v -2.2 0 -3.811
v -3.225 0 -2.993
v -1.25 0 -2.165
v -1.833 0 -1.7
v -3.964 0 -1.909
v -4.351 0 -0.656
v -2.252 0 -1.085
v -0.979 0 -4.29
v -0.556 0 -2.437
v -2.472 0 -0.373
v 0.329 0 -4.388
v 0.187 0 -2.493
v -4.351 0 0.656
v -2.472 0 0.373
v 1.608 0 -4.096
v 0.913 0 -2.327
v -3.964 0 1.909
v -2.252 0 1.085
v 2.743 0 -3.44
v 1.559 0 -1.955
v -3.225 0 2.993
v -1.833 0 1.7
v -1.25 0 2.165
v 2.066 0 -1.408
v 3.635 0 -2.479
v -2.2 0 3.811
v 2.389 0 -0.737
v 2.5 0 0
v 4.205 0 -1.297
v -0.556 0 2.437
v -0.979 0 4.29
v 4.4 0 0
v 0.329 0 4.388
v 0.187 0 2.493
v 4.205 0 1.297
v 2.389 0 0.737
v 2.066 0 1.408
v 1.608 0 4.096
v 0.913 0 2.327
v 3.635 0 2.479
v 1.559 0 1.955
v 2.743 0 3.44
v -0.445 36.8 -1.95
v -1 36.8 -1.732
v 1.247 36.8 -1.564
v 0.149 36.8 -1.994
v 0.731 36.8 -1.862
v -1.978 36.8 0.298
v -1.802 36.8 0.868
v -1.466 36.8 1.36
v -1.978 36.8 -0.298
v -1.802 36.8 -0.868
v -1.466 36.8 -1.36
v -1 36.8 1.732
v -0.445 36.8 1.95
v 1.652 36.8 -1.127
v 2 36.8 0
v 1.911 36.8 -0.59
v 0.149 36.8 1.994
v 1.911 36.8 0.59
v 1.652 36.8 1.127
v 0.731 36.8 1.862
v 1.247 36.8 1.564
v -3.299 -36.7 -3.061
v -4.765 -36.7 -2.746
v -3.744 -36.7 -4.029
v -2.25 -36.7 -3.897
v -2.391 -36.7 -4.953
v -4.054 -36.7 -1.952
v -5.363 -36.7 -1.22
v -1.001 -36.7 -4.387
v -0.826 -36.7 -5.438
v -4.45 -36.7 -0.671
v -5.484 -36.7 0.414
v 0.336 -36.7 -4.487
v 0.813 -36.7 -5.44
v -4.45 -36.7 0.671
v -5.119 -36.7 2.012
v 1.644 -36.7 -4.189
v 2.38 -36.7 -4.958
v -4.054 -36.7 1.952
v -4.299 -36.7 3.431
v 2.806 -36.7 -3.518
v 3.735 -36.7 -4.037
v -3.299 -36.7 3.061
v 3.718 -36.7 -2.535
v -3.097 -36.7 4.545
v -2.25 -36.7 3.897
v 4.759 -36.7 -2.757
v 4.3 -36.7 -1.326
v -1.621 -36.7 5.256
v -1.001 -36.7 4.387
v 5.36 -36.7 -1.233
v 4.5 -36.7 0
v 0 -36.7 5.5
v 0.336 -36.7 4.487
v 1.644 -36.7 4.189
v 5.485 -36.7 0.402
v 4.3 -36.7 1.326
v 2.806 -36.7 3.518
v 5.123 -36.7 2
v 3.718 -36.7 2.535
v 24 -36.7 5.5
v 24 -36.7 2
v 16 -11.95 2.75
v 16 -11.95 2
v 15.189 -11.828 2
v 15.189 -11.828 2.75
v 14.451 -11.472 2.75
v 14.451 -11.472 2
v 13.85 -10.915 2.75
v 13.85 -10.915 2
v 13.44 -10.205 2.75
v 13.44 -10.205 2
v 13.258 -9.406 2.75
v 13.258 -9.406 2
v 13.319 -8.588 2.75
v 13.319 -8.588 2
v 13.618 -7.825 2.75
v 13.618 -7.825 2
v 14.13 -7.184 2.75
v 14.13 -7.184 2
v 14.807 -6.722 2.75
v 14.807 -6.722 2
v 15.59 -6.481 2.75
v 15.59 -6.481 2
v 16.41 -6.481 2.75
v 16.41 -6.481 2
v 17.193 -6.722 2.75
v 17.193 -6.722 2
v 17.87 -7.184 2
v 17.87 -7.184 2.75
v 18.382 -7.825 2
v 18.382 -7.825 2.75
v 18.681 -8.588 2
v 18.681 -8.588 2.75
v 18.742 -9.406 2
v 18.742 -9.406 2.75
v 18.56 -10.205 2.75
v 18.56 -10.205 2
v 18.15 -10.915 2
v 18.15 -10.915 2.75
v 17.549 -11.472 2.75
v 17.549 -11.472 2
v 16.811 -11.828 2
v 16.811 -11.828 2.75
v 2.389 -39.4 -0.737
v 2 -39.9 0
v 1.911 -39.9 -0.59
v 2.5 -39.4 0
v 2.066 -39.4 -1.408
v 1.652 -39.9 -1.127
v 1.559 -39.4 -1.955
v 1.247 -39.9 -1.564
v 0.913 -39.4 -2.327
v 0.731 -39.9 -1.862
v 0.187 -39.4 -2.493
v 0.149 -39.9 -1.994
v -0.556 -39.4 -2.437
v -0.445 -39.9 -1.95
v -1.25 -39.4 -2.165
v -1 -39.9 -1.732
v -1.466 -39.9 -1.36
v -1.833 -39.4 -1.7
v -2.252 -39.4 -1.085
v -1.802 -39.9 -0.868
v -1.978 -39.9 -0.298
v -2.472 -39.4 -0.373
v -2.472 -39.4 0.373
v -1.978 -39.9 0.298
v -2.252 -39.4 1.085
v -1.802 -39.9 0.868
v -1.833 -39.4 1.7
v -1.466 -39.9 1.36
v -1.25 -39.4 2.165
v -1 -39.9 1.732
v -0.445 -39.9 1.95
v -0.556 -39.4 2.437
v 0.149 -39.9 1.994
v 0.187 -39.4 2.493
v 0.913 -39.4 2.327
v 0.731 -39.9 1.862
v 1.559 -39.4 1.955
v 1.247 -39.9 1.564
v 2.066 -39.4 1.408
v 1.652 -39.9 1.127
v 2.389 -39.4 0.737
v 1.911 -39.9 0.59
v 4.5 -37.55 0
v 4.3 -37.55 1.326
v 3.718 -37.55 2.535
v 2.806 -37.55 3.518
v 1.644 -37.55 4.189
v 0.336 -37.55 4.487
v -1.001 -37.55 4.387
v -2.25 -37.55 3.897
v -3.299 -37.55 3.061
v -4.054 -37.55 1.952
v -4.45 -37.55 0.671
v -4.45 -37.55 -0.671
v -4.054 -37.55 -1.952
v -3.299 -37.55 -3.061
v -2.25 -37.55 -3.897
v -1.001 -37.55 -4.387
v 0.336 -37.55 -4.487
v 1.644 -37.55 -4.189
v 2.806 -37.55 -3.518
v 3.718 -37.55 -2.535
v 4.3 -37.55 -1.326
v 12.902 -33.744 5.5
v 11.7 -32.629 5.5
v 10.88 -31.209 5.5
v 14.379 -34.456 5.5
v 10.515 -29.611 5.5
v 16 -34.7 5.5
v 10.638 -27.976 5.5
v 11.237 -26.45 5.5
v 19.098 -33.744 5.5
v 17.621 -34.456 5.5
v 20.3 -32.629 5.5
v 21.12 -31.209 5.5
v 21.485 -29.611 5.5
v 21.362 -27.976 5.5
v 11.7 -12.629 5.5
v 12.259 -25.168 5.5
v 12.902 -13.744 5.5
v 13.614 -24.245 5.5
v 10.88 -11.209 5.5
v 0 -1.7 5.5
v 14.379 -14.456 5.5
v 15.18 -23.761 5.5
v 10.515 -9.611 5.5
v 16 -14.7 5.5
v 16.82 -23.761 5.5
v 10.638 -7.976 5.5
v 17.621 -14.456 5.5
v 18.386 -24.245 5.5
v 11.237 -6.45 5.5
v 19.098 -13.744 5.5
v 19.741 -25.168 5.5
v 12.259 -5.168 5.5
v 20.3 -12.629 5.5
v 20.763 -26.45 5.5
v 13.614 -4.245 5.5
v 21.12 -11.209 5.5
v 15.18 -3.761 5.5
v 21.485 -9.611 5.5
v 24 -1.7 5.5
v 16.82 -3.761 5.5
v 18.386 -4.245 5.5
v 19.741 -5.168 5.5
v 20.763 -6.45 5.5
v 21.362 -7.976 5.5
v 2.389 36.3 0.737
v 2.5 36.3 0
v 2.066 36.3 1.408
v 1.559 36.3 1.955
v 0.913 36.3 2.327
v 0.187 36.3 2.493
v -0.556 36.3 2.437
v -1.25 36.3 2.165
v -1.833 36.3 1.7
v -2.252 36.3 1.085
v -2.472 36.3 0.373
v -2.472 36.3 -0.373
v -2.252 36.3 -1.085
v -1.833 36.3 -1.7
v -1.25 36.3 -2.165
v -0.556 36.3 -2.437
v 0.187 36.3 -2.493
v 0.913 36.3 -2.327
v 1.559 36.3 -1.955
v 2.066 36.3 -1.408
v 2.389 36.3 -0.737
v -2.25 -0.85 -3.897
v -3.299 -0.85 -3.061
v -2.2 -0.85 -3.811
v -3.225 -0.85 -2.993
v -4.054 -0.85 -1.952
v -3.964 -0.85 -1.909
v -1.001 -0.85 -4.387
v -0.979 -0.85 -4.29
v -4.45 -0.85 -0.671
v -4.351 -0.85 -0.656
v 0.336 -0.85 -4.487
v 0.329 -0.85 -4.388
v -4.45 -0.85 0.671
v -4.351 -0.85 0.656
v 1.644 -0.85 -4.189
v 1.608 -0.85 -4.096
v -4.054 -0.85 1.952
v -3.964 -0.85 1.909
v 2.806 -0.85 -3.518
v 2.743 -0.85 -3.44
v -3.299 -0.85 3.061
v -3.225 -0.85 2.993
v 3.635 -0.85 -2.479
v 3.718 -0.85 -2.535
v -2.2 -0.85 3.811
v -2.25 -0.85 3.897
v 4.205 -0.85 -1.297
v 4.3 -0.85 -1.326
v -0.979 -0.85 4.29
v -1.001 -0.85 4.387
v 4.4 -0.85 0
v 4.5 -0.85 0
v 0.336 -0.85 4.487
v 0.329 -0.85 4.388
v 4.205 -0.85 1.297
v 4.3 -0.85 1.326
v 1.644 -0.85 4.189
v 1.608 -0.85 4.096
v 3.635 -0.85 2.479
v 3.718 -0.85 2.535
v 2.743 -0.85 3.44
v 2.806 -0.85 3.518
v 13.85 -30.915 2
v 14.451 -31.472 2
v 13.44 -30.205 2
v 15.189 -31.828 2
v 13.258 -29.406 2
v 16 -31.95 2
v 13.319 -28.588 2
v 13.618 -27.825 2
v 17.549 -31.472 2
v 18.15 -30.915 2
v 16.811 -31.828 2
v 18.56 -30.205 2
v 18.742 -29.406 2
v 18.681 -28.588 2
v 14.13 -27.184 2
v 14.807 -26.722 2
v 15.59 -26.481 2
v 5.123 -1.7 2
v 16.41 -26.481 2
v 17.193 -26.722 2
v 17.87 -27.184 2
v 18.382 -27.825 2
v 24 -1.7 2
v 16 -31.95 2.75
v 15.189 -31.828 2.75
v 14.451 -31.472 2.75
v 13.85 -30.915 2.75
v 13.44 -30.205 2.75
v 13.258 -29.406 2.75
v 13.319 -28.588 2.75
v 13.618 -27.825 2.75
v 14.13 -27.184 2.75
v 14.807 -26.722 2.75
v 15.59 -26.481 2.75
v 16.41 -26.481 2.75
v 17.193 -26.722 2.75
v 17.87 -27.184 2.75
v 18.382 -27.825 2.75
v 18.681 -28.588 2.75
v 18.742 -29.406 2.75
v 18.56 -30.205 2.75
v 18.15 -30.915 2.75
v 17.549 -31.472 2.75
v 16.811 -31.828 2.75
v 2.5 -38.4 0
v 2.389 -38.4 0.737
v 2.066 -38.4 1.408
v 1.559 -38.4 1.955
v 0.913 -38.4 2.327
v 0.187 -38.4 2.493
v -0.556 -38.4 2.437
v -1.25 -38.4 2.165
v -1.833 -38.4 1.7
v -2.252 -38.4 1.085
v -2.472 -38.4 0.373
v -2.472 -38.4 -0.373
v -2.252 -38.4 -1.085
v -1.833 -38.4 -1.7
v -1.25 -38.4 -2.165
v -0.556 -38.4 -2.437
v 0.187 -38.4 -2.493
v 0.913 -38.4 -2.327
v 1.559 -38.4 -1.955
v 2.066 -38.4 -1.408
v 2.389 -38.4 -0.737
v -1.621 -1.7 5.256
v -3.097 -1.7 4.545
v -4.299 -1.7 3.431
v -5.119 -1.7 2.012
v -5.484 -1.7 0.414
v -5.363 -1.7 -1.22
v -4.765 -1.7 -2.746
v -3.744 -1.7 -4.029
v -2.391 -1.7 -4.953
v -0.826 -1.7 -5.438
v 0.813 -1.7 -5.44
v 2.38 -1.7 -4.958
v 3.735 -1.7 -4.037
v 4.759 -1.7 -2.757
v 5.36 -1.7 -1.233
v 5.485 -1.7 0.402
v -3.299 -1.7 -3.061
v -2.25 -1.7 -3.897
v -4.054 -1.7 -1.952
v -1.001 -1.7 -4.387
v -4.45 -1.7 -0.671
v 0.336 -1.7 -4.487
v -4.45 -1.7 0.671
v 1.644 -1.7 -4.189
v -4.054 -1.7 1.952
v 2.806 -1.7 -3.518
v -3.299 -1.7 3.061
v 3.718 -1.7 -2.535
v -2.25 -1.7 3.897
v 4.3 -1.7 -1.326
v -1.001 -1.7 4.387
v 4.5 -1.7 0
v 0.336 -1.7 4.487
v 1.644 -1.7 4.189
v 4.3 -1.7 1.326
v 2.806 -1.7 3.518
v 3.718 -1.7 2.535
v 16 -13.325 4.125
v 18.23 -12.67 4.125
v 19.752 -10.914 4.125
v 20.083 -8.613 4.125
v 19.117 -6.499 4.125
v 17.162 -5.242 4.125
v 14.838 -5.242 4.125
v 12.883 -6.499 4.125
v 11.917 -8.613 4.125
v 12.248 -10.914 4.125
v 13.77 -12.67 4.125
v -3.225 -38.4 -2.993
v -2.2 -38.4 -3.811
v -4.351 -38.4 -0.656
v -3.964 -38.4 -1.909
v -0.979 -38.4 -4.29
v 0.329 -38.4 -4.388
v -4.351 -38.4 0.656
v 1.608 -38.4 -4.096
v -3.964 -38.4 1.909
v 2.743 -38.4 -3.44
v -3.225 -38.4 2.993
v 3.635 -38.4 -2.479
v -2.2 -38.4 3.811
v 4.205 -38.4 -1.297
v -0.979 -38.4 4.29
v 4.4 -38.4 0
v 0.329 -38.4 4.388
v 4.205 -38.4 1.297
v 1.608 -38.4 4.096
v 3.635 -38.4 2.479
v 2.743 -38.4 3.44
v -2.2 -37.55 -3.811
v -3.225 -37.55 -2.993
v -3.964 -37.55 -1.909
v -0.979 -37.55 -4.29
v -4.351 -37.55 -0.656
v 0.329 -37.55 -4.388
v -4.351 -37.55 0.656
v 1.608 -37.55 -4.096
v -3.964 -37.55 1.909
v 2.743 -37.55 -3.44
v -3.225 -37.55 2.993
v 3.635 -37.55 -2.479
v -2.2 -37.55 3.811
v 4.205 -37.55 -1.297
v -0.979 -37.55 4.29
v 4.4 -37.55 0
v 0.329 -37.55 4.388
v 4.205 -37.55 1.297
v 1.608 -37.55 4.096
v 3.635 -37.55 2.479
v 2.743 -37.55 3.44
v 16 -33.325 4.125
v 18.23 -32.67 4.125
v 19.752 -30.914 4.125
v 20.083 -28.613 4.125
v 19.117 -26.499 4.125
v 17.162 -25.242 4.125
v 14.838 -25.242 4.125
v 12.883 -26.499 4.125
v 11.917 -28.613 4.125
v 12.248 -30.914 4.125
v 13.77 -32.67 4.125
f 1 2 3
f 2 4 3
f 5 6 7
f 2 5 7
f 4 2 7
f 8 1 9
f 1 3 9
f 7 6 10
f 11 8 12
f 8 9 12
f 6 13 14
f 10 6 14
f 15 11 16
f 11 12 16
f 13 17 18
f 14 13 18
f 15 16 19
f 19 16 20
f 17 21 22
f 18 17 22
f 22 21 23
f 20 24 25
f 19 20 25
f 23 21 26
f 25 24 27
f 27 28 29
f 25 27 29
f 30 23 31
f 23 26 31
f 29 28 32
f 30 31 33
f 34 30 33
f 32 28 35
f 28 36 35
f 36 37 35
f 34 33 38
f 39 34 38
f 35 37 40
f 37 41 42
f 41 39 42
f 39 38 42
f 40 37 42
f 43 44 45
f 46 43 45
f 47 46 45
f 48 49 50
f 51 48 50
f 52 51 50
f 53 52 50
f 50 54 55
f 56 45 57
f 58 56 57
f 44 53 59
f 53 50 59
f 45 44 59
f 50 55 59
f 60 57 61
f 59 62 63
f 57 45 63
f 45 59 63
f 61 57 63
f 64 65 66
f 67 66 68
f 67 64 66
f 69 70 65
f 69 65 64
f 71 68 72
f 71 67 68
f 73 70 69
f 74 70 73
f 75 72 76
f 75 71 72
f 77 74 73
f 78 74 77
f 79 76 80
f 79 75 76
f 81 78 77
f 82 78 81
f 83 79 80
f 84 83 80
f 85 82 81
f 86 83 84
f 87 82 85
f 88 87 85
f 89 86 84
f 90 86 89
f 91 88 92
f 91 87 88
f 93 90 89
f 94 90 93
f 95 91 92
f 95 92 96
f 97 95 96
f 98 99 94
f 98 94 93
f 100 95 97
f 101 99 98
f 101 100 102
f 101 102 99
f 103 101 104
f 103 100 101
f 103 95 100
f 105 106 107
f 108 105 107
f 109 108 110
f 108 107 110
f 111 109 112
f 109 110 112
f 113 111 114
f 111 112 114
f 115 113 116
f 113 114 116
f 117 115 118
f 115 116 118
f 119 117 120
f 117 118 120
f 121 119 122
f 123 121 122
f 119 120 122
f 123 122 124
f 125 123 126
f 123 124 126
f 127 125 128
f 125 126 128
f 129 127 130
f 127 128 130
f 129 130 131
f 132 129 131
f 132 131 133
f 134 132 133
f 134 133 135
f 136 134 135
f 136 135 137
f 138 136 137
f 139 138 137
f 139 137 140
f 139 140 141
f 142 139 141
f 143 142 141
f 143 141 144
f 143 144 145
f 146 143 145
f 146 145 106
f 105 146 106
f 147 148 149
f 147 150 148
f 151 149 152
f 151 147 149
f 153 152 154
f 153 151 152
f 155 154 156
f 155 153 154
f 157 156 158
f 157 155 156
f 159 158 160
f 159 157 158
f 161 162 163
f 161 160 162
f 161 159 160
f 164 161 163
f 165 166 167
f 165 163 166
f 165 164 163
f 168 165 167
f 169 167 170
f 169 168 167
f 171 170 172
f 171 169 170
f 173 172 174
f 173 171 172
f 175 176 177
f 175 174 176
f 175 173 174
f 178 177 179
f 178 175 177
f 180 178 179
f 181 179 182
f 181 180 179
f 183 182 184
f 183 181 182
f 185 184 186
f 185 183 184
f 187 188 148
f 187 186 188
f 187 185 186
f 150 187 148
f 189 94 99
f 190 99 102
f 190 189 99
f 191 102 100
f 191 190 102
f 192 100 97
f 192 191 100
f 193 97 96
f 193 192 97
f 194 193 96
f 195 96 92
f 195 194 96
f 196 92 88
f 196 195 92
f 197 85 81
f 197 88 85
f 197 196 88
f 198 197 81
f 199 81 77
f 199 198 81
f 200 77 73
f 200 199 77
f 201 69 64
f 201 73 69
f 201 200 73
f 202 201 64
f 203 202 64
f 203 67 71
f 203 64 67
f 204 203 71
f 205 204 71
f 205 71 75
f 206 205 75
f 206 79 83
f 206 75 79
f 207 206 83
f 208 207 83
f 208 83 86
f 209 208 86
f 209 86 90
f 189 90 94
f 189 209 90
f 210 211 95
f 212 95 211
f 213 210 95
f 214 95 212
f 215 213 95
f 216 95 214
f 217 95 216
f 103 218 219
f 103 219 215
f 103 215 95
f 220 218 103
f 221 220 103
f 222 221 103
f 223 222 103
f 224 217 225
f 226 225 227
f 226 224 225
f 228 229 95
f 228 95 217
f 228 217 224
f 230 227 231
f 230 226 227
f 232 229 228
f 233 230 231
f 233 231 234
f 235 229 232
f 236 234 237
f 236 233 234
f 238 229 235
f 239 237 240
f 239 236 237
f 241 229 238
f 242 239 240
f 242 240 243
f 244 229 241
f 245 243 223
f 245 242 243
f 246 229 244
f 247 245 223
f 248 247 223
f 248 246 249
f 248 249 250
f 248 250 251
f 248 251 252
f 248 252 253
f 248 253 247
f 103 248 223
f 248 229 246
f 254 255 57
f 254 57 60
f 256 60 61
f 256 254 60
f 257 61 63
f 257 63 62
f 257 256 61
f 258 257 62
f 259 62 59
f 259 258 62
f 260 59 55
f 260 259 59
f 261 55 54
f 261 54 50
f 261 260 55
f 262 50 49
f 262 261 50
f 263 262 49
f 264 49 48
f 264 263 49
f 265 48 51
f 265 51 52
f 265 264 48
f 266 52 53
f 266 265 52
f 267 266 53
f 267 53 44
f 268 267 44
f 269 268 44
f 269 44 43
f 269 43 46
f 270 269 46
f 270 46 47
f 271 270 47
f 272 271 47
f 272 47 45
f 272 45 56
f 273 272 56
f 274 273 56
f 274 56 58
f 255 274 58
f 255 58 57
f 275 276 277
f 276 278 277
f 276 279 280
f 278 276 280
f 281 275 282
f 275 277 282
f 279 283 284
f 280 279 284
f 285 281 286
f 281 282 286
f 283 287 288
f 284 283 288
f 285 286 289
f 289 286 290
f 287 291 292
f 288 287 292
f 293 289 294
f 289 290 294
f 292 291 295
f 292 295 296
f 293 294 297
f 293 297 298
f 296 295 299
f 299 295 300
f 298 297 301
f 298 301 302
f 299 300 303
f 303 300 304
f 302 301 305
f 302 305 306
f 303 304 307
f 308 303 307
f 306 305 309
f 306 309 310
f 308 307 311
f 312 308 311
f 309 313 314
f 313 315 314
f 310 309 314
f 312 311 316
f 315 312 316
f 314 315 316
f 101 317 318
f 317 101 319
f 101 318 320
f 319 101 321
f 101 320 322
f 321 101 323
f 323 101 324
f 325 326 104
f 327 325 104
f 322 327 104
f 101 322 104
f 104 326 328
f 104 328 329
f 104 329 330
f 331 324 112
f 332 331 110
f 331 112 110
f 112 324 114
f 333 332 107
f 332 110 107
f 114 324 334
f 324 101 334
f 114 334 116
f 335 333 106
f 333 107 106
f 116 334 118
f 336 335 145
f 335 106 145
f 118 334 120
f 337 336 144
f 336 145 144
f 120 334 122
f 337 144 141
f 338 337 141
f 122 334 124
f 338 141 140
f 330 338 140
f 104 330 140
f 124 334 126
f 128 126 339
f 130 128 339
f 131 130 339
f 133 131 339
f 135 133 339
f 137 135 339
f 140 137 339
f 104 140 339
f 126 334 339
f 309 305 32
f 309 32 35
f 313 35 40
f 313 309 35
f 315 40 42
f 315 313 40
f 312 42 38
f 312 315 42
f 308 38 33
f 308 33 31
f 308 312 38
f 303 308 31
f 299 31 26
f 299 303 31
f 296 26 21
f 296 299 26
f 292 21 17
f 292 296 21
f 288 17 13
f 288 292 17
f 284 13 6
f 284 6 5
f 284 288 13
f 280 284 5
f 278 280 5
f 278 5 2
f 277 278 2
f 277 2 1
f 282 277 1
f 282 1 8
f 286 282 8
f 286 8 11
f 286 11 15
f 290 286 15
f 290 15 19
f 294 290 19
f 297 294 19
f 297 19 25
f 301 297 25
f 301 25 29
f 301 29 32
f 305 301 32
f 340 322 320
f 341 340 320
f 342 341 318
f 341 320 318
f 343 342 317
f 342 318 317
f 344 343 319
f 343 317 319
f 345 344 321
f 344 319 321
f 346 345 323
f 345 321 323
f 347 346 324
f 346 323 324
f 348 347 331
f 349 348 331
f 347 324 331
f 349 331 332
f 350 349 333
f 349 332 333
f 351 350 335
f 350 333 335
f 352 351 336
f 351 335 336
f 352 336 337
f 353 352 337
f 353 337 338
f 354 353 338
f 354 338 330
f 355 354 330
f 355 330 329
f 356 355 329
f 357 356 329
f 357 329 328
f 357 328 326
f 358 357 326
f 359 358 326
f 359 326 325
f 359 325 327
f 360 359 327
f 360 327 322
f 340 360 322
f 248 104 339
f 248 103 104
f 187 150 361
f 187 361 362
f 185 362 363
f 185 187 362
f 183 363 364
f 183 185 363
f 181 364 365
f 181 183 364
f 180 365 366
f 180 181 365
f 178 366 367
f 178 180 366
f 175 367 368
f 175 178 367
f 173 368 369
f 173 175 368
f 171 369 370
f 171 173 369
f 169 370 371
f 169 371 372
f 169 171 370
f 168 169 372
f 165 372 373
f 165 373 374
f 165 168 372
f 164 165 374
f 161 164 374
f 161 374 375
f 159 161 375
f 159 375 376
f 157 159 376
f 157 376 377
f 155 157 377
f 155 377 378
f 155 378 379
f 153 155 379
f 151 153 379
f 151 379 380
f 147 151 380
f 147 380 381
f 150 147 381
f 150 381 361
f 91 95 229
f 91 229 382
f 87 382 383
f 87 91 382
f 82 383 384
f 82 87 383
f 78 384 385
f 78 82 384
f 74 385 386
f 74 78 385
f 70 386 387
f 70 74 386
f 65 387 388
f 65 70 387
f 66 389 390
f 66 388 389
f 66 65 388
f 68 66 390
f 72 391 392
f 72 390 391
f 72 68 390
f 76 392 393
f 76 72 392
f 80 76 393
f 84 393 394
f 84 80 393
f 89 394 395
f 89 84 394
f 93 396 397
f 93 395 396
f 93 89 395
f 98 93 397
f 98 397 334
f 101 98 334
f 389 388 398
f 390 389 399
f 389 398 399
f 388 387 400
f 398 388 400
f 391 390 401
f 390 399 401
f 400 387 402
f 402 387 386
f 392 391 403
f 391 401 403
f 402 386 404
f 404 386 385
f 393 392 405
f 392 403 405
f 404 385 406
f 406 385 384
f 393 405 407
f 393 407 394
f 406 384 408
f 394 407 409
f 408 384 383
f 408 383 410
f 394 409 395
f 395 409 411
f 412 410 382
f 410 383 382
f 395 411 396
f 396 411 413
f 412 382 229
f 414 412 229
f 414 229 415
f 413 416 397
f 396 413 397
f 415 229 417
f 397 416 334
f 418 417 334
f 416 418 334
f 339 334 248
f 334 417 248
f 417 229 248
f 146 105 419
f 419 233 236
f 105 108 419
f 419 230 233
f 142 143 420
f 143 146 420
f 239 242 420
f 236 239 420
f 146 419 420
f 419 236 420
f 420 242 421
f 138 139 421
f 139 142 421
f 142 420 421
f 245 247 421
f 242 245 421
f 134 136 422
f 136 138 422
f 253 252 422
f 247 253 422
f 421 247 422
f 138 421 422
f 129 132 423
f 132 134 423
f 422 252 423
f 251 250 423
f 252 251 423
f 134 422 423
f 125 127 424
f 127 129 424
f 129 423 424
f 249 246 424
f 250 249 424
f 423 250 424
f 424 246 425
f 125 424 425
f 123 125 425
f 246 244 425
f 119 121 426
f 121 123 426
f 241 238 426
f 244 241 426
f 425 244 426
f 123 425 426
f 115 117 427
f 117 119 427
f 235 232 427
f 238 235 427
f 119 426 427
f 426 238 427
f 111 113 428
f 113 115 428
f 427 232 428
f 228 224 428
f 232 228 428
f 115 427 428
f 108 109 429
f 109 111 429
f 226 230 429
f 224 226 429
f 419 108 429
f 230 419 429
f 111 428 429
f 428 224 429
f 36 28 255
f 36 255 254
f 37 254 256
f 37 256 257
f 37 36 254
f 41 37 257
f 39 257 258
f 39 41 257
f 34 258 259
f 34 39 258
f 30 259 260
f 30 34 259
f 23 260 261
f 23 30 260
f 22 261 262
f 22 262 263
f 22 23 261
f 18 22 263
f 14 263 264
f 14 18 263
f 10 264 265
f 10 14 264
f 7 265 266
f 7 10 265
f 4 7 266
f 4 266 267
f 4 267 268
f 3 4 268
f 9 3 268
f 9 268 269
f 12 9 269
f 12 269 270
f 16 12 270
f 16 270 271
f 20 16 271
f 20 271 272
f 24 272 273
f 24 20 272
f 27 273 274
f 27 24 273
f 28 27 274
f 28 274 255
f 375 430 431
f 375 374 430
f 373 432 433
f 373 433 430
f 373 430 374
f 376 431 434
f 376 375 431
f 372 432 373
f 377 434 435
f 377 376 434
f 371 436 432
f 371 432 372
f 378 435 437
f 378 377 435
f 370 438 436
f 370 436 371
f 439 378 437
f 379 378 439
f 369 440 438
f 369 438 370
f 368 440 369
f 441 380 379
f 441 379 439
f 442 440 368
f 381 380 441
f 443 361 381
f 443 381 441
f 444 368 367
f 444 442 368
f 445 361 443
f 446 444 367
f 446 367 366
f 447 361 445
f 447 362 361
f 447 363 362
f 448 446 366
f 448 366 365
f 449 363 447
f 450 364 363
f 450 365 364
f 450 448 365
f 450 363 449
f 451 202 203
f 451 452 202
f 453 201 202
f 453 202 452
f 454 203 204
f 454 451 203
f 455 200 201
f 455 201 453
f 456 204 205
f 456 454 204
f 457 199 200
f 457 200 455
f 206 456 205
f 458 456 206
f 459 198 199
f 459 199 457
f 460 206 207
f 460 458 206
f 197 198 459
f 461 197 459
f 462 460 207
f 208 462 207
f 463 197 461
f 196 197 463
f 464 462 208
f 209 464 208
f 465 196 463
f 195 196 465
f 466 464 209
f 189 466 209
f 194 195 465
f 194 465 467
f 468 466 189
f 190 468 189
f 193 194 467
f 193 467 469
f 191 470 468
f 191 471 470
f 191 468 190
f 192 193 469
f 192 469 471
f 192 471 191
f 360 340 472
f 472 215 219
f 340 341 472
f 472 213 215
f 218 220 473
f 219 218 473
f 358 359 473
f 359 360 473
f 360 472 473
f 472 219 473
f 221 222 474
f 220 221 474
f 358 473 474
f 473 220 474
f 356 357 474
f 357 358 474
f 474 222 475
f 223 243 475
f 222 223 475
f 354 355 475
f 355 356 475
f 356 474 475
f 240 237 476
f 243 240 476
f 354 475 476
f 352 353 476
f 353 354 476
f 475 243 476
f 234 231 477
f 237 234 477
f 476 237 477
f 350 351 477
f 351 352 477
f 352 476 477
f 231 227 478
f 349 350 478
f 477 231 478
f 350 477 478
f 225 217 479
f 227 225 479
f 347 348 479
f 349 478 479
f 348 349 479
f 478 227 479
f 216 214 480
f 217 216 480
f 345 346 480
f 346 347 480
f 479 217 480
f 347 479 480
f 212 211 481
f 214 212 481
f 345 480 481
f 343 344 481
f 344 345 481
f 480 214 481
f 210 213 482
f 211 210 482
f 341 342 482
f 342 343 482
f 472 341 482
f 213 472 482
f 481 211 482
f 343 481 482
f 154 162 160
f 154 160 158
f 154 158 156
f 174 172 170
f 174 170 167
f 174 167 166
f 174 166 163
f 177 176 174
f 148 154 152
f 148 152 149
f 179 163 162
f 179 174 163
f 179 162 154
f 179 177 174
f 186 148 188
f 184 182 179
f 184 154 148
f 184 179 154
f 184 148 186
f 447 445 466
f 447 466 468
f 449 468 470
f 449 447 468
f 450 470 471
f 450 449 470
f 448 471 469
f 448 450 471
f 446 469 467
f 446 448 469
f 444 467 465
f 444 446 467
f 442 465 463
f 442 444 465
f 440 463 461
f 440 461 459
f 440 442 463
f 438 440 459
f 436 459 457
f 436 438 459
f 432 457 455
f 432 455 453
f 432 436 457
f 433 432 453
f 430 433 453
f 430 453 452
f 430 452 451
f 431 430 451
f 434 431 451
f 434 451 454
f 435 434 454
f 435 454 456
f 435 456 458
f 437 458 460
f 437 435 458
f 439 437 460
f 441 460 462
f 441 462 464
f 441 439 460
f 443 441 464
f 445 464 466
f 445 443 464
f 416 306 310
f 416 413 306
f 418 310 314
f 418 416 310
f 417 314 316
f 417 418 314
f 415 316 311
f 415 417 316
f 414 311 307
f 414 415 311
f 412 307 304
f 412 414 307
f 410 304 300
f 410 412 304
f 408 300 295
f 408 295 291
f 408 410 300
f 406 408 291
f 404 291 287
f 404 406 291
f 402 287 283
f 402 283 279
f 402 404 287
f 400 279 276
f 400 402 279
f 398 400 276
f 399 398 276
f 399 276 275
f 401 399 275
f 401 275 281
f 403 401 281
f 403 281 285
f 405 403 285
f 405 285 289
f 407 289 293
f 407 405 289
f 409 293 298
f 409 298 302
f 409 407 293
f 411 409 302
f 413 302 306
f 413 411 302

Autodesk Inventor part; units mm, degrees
sketch "Sketch_1" plane through (0, 0, 0) normal (0, 0, 1) x (1, 0, 0)
  line L0 (0, -39.9) -> (0, 36.8)
  line L1 (0, 36.8) -> (2, 36.8)
  line L2 (2, 36.8) -> (2.5, 36.3)
  line L3 (2.5, 36.3) -> (2.5, 0)
  line L4 (2.5, 0) -> (4.4, 0)
  line L5 (4.4, 0) -> (4.4, -0.85)
  line L6 (4.4, -0.85) -> (4.5, -0.85)
  line L7 (4.5, -0.85) -> (4.5, -1.7)
  line L8 (4.5, -1.7) -> (5.5, -1.7)
  line L9 (5.5, -1.7) -> (5.5, -36.7)
  line L10 (5.5, -36.7) -> (4.5, -36.7)
  line L11 (4.5, -36.7) -> (4.5, -37.55)
  line L12 (4.5, -37.55) -> (4.4, -37.55)
  line L13 (4.4, -37.55) -> (4.4, -38.4)
  line L14 (4.4, -38.4) -> (2.5, -38.4)
  line L15 (2.5, -38.4) -> (2.5, -39.4)
  line L16 (2.5, -39.4) -> (2, -39.9)
  line L17 (2, -39.9) -> (0, -39.9)
  line L18 (0, -39.9) -> (0, 36.8)
revolve "Revolution1" add sketch "Sketch_1" angle 360 about axis through (0, -39.9, 0) along (0, -1, 0)
sketch "Sketch_2" plane through (0, 0, 5.5) normal (0, 0, 1) x (1, 0, 0)
  line L0 (0, -36.7) -> (24, -36.7)
  line L1 (24, -36.7) -> (24, -1.7)
  line L2 (24, -1.7) -> (0, -1.7)
  line L3 (0, -1.7) -> (0, -36.7)
extrude "Extrusion1" add sketch "Sketch_2" against normal blind 3.5
sketch "Sketch3" plane through (0, 0, 5.5) normal (0, 0, 1) x (1, 0, 0)
  point P0 (16, -9.2)
hole "Hole1" at (16, -9.2, 5.5) direction (0, 0, -1) diameter 5.5 depth 3.5 countersink diameter 11 countersink angle 90
sketch "Sketch4" plane through (0, 0, 5.5) normal (0, 0, 1) x (1, 0, 0)
  point P0 (16, -29.2)
hole "Hole2" at (16, -29.2, 5.5) direction (0, 0, -1) diameter 5.5 depth 3.5 countersink diameter 11 countersink angle 90
ref_plane "1_XY" through (0, 0, 0) normal (0, 1, 0) x (1, 0, 0)
ref_plane "1_YZ" through (0, 0, 0) normal (1, 0, 0) x (0, 0, -1)
ref_plane "1_ZX" through (0, 0, 0) normal (0, 0, -1) x (0, 1, 0)
ref_plane "to_bolt1_XY" through (16, -9.2, 5.5) normal (0, 0, 1) x (1, 0, 0)
ref_plane "to_bolt1_YZ" through (16, -9.2, 5.5) normal (1, 0, 0) x (0, 1, 0)
ref_plane "to_bolt1_ZX" through (16, -9.2, 5.5) normal (0, 1, 0) x (0, 0, 1)
ref_plane "to_bolt1_r_XY" through (-16, -9.2, 5.5) normal (0, 0, 1) x (1, 0, 0)
ref_plane "to_bolt1_r_YZ" through (-16, -9.2, 5.5) normal (1, 0, 0) x (0, 1, 0)
ref_plane "to_bolt1_r_ZX" through (-16, -9.2, 5.5) normal (0, 1, 0) x (0, 0, 1)
ref_plane "to_bolt2_XY" through (16, -29.2, 5.5) normal (0, 0, 1) x (1, 0, 0)
ref_plane "to_bolt2_YZ" through (16, -29.2, 5.5) normal (1, 0, 0) x (0, 1, 0)
ref_plane "to_bolt2_ZX" through (16, -29.2, 5.5) normal (0, 1, 0) x (0, 0, 1)
ref_plane "to_bolt2_r_XY" through (-16, -29.2, 5.5) normal (0, 0, 1) x (1, 0, 0)
ref_plane "to_bolt2_r_YZ" through (-16, -29.2, 5.5) normal (1, 0, 0) x (0, 1, 0)
ref_plane "to_bolt2_r_ZX" through (-16, -29.2, 5.5) normal (0, 1, 0) x (0, 0, 1)
properties part number "HHPFLN5-1"
